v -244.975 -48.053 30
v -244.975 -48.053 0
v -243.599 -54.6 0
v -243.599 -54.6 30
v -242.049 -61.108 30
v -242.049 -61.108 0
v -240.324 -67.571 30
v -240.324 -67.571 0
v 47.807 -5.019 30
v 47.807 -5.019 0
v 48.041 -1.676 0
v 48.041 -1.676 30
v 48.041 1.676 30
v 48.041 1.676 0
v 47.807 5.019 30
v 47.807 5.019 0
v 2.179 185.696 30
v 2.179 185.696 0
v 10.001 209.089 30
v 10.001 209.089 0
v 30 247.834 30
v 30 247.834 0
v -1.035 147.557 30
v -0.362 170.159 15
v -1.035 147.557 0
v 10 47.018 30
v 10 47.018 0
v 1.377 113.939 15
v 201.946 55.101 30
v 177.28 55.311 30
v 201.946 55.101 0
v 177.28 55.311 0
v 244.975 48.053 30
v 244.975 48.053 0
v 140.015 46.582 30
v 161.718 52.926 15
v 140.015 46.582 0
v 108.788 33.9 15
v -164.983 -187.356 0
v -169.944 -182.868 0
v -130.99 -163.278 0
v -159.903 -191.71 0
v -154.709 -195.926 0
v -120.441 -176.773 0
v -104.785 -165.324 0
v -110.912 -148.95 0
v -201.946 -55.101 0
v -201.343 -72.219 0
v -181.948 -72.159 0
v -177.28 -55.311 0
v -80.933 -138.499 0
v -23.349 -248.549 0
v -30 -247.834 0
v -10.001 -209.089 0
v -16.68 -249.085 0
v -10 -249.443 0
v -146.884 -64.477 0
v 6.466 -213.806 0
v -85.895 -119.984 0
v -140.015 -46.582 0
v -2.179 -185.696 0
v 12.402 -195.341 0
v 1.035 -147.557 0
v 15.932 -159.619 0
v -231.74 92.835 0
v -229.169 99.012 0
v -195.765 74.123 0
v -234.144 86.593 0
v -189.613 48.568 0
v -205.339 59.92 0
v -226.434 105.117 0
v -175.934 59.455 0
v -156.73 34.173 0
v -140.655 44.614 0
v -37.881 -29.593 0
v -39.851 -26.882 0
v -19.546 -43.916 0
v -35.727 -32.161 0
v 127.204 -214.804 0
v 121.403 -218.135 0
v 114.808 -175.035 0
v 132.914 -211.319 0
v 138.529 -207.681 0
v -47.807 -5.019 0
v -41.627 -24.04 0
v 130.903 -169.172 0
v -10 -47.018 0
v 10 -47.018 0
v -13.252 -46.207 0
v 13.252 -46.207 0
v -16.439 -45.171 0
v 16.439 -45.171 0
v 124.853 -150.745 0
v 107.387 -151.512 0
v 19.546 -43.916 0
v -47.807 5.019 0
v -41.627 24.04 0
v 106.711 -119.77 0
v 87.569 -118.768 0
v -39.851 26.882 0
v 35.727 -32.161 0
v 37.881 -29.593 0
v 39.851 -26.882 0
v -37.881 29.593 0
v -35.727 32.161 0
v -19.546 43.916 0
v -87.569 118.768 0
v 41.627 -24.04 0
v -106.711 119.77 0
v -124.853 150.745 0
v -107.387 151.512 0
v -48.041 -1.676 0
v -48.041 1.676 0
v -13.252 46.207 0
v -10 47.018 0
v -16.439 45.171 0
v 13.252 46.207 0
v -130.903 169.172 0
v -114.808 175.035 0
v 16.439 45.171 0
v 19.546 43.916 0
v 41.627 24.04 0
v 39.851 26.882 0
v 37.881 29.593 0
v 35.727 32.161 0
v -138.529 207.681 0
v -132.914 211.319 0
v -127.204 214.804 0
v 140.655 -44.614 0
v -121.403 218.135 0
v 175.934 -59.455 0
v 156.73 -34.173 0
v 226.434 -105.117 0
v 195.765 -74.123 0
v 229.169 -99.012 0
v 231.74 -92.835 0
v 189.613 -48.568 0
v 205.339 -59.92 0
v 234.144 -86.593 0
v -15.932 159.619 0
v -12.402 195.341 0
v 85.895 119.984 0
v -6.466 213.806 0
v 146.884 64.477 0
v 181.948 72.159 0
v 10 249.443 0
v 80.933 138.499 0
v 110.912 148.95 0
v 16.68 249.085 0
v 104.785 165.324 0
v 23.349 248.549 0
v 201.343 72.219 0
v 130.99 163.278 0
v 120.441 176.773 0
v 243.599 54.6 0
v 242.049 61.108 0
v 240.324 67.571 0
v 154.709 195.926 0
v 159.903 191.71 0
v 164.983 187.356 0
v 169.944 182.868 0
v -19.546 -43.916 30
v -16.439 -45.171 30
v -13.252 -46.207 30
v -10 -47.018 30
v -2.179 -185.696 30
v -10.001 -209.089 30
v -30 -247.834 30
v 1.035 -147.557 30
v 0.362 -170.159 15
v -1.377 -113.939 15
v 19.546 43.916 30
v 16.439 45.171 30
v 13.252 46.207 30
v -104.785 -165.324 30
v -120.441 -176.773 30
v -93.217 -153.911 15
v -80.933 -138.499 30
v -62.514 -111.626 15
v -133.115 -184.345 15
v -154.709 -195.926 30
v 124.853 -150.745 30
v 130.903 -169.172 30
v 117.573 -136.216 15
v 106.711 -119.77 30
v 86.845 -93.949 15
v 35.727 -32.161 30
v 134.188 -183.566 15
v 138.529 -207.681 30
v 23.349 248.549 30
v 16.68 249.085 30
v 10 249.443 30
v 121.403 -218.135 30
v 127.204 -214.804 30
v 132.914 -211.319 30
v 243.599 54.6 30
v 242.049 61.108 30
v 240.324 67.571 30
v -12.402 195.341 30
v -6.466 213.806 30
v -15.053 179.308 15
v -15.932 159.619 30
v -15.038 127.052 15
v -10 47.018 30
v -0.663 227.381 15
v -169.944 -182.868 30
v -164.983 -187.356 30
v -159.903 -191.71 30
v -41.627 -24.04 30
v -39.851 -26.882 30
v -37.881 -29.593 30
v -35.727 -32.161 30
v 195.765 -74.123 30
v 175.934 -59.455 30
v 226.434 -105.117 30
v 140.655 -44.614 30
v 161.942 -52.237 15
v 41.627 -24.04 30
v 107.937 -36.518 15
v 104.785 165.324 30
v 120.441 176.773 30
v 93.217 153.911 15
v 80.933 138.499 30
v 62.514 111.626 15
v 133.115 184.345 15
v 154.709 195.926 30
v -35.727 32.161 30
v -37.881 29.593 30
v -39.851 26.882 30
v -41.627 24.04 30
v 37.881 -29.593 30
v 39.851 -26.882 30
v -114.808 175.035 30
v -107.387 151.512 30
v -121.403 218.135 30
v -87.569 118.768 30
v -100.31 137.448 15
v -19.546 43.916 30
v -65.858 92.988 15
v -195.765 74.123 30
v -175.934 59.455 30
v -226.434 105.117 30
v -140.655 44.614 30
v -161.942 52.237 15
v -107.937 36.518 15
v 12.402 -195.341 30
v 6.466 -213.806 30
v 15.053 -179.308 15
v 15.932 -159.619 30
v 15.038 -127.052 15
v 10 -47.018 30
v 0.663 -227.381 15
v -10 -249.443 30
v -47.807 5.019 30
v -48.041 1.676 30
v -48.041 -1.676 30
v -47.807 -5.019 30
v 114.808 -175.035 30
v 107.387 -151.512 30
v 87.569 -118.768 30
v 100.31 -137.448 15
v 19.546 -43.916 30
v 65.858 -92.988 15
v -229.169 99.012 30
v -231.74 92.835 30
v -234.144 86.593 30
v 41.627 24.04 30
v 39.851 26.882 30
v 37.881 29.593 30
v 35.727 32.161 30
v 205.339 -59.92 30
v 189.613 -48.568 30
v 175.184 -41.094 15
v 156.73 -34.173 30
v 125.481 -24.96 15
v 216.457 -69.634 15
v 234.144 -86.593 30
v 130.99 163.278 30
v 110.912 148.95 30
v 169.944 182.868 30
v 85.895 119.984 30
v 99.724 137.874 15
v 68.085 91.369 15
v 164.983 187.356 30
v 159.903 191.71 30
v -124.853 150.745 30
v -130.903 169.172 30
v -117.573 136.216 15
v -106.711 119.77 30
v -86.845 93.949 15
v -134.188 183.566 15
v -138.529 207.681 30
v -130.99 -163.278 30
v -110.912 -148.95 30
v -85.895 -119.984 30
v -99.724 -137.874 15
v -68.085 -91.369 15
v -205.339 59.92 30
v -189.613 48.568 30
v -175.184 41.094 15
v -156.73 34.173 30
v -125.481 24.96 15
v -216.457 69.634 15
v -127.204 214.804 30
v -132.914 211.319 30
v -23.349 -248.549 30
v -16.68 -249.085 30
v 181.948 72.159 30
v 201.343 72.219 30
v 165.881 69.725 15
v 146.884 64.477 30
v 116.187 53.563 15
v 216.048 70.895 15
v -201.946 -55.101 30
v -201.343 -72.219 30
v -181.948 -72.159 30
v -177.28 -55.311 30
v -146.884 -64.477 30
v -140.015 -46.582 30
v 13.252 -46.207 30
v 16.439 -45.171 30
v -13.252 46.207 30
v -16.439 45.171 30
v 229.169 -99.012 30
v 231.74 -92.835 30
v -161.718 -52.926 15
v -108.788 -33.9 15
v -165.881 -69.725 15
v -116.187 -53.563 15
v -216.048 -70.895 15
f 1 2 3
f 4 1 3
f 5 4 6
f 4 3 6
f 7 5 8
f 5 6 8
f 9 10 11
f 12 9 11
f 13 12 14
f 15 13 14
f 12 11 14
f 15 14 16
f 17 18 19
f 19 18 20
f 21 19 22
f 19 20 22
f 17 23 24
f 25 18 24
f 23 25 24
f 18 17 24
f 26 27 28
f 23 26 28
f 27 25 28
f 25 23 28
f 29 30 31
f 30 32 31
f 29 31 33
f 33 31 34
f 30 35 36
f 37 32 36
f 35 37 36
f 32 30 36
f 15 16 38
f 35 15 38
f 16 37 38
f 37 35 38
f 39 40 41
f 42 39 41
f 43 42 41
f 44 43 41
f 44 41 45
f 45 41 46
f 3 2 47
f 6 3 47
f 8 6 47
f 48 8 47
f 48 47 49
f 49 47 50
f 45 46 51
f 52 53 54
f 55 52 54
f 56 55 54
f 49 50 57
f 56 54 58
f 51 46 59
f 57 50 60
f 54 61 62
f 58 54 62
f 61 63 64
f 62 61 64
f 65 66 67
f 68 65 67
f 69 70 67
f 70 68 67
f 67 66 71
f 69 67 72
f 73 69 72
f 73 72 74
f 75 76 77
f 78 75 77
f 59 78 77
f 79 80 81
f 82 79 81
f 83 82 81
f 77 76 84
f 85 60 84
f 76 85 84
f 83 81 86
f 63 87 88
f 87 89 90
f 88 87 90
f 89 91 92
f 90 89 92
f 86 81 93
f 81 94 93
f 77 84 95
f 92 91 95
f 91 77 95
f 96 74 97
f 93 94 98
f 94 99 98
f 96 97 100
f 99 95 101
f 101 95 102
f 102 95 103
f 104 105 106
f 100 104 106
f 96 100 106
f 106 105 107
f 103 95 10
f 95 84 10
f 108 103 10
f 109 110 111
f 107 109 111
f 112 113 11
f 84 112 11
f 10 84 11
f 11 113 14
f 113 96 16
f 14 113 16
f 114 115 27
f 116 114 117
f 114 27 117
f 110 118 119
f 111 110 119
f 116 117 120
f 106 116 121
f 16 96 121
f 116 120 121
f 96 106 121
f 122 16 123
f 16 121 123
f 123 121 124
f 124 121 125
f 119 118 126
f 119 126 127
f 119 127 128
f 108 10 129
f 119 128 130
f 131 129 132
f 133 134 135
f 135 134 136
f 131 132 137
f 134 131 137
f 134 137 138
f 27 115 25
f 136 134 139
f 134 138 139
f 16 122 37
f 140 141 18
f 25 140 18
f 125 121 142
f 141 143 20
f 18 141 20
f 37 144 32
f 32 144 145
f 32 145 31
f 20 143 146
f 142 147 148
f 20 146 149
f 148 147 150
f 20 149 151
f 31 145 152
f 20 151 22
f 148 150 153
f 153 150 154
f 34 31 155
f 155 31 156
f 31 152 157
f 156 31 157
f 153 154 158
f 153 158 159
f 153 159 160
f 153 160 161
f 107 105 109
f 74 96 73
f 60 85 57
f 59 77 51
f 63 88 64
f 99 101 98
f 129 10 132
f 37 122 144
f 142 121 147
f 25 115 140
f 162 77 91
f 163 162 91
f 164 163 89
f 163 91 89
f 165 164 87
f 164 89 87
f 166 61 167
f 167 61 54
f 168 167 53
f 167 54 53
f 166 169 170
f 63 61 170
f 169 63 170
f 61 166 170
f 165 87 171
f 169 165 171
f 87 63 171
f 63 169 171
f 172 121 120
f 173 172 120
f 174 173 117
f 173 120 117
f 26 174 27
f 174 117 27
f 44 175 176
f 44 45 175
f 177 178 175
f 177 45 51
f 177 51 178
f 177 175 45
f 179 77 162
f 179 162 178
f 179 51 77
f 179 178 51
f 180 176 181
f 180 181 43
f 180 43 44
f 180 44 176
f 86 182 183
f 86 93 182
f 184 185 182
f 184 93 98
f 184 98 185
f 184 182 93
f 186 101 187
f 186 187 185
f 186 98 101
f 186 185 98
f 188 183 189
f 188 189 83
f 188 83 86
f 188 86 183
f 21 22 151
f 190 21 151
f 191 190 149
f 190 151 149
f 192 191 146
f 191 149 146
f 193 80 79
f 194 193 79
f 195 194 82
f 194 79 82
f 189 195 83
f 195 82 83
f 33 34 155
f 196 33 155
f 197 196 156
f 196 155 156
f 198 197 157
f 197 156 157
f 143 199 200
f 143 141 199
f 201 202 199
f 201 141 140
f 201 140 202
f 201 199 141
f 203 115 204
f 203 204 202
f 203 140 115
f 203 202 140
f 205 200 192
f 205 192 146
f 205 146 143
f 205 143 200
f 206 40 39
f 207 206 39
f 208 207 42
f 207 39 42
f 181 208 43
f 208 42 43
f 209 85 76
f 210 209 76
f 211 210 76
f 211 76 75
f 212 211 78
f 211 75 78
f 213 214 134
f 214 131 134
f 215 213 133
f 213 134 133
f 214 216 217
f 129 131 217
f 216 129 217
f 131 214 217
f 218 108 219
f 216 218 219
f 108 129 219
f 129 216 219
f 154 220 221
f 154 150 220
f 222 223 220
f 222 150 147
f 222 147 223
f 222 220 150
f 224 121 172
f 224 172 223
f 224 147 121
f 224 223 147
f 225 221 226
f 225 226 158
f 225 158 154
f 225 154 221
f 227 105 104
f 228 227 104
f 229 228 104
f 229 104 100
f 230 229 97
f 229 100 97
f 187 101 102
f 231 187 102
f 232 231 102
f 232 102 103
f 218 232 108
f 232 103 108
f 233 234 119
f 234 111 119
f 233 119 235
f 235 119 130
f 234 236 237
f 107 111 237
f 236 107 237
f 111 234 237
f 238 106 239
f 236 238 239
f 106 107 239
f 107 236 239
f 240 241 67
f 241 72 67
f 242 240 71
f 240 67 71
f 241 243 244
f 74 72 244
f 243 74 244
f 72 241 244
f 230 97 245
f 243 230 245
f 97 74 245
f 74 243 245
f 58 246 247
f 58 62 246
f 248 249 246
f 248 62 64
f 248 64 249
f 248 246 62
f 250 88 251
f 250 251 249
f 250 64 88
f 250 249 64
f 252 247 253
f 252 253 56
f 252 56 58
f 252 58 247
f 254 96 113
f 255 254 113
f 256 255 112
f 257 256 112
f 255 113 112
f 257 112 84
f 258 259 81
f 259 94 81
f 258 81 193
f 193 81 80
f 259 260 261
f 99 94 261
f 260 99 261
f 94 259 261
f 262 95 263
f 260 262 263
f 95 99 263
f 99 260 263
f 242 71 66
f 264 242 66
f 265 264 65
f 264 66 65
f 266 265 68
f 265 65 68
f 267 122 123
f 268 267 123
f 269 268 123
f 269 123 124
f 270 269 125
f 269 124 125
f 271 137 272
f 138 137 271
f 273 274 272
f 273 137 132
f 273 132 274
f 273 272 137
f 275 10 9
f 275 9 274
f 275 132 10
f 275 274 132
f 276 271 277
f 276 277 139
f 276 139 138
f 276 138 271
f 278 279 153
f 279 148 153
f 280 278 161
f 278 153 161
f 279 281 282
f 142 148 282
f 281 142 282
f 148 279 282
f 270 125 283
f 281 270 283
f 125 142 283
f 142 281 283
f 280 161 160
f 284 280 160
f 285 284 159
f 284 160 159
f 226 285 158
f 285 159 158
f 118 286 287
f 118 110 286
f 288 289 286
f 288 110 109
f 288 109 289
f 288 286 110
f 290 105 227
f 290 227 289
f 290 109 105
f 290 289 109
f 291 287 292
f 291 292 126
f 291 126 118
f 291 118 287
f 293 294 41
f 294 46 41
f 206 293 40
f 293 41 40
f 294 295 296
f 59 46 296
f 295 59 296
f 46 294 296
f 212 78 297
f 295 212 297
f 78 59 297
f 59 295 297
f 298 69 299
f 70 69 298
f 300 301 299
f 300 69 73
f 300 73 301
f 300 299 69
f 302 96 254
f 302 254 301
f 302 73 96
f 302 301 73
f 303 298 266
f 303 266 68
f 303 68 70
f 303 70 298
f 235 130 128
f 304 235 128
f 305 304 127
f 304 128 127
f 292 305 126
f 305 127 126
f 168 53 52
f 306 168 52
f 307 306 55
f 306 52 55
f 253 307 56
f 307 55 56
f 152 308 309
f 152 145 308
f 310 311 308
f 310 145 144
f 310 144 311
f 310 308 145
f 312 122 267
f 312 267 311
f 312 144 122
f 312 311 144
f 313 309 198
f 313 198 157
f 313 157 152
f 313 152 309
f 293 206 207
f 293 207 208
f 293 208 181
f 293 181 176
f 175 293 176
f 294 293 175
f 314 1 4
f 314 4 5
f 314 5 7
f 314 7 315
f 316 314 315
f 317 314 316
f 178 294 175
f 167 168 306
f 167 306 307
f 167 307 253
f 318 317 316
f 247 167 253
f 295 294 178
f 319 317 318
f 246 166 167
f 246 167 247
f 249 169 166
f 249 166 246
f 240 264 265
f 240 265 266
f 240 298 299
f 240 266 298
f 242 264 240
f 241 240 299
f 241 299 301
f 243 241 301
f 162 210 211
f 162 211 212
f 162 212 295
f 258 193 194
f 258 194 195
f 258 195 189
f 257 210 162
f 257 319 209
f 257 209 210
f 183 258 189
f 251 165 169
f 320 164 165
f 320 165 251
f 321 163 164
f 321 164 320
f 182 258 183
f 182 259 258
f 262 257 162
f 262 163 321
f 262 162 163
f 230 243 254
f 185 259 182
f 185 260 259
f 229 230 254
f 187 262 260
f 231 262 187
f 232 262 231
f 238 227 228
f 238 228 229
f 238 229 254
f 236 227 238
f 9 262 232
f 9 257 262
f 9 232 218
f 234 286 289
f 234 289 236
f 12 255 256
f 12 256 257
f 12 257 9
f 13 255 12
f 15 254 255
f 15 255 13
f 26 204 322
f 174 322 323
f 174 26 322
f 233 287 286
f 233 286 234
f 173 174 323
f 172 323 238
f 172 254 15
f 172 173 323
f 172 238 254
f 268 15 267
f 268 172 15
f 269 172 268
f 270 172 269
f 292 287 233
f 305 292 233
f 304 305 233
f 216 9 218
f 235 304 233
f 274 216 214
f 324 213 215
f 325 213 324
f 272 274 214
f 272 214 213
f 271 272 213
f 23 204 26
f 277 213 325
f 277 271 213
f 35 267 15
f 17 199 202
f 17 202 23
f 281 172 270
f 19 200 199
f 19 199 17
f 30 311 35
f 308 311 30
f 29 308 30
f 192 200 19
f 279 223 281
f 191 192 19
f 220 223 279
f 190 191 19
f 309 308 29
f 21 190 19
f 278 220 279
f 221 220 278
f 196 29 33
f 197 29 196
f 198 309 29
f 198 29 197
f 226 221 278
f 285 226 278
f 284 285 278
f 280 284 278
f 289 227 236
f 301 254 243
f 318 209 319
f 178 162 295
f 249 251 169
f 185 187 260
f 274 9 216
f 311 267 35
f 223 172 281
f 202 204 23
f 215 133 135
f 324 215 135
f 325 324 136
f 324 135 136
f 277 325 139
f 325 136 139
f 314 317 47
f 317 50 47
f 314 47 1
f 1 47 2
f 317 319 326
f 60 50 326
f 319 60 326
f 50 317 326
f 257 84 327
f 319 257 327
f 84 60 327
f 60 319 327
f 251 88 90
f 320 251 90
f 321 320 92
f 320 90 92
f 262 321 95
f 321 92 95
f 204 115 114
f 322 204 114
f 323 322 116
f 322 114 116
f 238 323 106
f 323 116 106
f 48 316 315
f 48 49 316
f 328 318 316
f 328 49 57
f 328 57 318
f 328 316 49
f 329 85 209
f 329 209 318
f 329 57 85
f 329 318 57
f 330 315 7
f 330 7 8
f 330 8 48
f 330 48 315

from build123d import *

# Parameters (mm, degrees)
BOSS_EXTRUDE3_DEPTH = 30


with BuildPart() as part:
    # Sketch1 → Boss-Extrude3 (new body)
    with BuildSketch(Plane.XY):
        with BuildLine():
            ThreePointArc((-10, 47.018073759), (-14.854364506, 45.717033096), (-19.546360403, 43.916273236))
            add(Edge.make_bspline(
                [(-19.546360403, 43.916273236), (-113.09637125, 140.200566945), (-121.402656368, 218.135469823)],
                knots=[0, 0, 0, 1, 1, 1], degree=2, weights=[1, 2.333333333, 1]))
            ThreePointArc((-121.402656368, 218.135469823), (-130.070701563, 213.080503011), (-138.528602909, 207.681280679))
            add(Edge.make_bspline(
                [(-35.72670029, 32.160568191), (-127.721013505, 141.647594866), (-138.528602909, 207.681280679)],
                knots=[0, 0, 0, 1, 1, 1], degree=2, weights=[1, 3, 1]))
            ThreePointArc((-35.72670029, 32.160568191), (-38.889231158, 28.254680318), (-41.626675488, 24.039948997))
            add(Edge.make_bspline(
                [(-41.626675488, 24.039948997), (-173.904711956, 46.948262171), (-226.433624328, 105.116611161)],
                knots=[0, 0, 0, 1, 1, 1], degree=2, weights=[1, 2.333333333, 1]))
            ThreePointArc((-226.433624328, 105.116611161), (-230.474985255, 95.932107972), (-234.14398792, 86.592615672))
            add(Edge.make_bspline(
                [(-47.807015375, 5.018818671), (-186.586837749, 39.522783313), (-234.14398792, 86.592615672)],
                knots=[0, 0, 0, 1, 1, 1], degree=2, weights=[1, 3, 1]))
            ThreePointArc((-47.807015375, 5.018818671), (-48.069733304, 0), (-47.807015375, -5.018818671))
            add(Edge.make_bspline(
                [(-47.807015375, -5.018818671), (-168.2873635, -64.236683039), (-244.974643991, -48.053220183)],
                knots=[0, 0, 0, 1, 1, 1], degree=2, weights=[1, 2.333333333, 1]))
            ThreePointArc((-244.974643991, -48.053220183), (-242.845658137, -57.8590917), (-240.324327808, -67.571485346))
            add(Edge.make_bspline(
                [(-41.626675488, -24.039948997), (-174.182831827, -77.698388136), (-240.324327808, -67.571485346)],
                knots=[0, 0, 0, 1, 1, 1], degree=2, weights=[1, 3, 1]))
            ThreePointArc((-41.626675488, -24.039948997), (-38.889231158, -28.254680318), (-35.72670029, -32.160568191))
            add(Edge.make_bspline(
                [(-35.72670029, -32.160568191), (-98.389962063, -150.885398653), (-169.943676031, -182.868354686)],
                knots=[0, 0, 0, 1, 1, 1], degree=2, weights=[1, 2.333333333, 1]))
            ThreePointArc((-169.943676031, -182.868354686), (-162.457543631, -189.5500849), (-154.708942796, -195.925575633))
            add(Edge.make_bspline(
                [(-19.546360403, -43.916273236), (-95.246904403, -165.241416188), (-154.708942796, -195.925575633)],
                knots=[0, 0, 0, 1, 1, 1], degree=2, weights=[1, 3, 1]))
            ThreePointArc((-19.546360403, -43.916273236), (-14.854364506, -45.717033096), (-10, -47.018073759))
            add(Edge.make_bspline(
                [(-10, -47.018073759), (9.08906073, -179.901020388), (-30, -247.833993165)],
                knots=[0, 0, 0, 1, 1, 1], degree=2, weights=[1, 2.333333333, 1]))
            ThreePointArc((-30, -247.833993165), (-20.016169186, -248.839388239), (-10, -249.442755293))
            add(Edge.make_bspline(
                [(10, -47.018073759), (20.070103179, -189.667839605), (-10, -249.442755293)],
                knots=[0, 0, 0, 1, 1, 1], degree=2, weights=[1, 3, 1]))
            ThreePointArc((10, -47.018073759), (14.854364506, -45.717033096), (19.546360403, -43.916273236))
            add(Edge.make_bspline(
                [(19.546360403, -43.916273236), (113.09637125, -140.200566945), (121.402656368, -218.135469823)],
                knots=[0, 0, 0, 1, 1, 1], degree=2, weights=[1, 2.333333333, 1]))
            ThreePointArc((121.402656368, -218.135469823), (130.070701563, -213.080503011), (138.528602909, -207.681280679))
            add(Edge.make_bspline(
                [(35.72670029, -32.160568191), (127.721013505, -141.647594866), (138.528602909, -207.681280679)],
                knots=[0, 0, 0, 1, 1, 1], degree=2, weights=[1, 3, 1]))
            ThreePointArc((35.72670029, -32.160568191), (38.889231158, -28.254680318), (41.626675488, -24.039948997))
            add(Edge.make_bspline(
                [(41.626675488, -24.039948997), (173.904711956, -46.948262171), (226.433624328, -105.116611161)],
                knots=[0, 0, 0, 1, 1, 1], degree=2, weights=[1, 2.333333333, 1]))
            ThreePointArc((226.433624328, -105.116611161), (230.474985255, -95.932107972), (234.14398792, -86.592615672))
            add(Edge.make_bspline(
                [(47.807015375, -5.018818671), (186.586837749, -39.522783313), (234.14398792, -86.592615672)],
                knots=[0, 0, 0, 1, 1, 1], degree=2, weights=[1, 3, 1]))
            ThreePointArc((47.807015375, -5.018818671), (48.069733304, 0), (47.807015375, 5.018818671))
            add(Edge.make_bspline(
                [(47.807015375, 5.018818671), (168.2873635, 64.236683039), (244.974643991, 48.053220183)],
                knots=[0, 0, 0, 1, 1, 1], degree=2, weights=[1, 2.333333333, 1]))
            ThreePointArc((244.974643991, 48.053220183), (242.845658137, 57.8590917), (240.324327808, 67.571485346))
            add(Edge.make_bspline(
                [(41.626675488, 24.039948997), (174.182831827, 77.698388136), (240.324327808, 67.571485346)],
                knots=[0, 0, 0, 1, 1, 1], degree=2, weights=[1, 3, 1]))
            ThreePointArc((41.626675488, 24.039948997), (38.889231158, 28.254680318), (35.72670029, 32.160568191))
            add(Edge.make_bspline(
                [(35.72670029, 32.160568191), (98.389962063, 150.885398653), (169.943676031, 182.868354686)],
                knots=[0, 0, 0, 1, 1, 1], degree=2, weights=[1, 2.333333333, 1]))
            ThreePointArc((169.943676031, 182.868354686), (162.457543631, 189.5500849), (154.708942796, 195.925575633))
            add(Edge.make_bspline(
                [(19.546360403, 43.916273236), (95.246904403, 165.241416188), (154.708942796, 195.925575633)],
                knots=[0, 0, 0, 1, 1, 1], degree=2, weights=[1, 3, 1]))
            ThreePointArc((19.546360403, 43.916273236), (14.854364506, 45.717033096), (10, 47.018073759))
            add(Edge.make_bspline(
                [(10, 47.018073759), (-9.08906073, 179.901020388), (30, 247.833993165)],
                knots=[0, 0, 0, 1, 1, 1], degree=2, weights=[1, 2.333333333, 1]))
            ThreePointArc((30, 247.833993165), (20.016169186, 248.839388239), (10, 249.442755293))
            add(Edge.make_bspline(
                [(-10, 47.018073759), (-20.070103179, 189.667839605), (10, 249.442755293)],
                knots=[0, 0, 0, 1, 1, 1], degree=2, weights=[1, 3, 1]))
        make_face()
    extrude(amount=BOSS_EXTRUDE3_DEPTH)


solid = part.part
